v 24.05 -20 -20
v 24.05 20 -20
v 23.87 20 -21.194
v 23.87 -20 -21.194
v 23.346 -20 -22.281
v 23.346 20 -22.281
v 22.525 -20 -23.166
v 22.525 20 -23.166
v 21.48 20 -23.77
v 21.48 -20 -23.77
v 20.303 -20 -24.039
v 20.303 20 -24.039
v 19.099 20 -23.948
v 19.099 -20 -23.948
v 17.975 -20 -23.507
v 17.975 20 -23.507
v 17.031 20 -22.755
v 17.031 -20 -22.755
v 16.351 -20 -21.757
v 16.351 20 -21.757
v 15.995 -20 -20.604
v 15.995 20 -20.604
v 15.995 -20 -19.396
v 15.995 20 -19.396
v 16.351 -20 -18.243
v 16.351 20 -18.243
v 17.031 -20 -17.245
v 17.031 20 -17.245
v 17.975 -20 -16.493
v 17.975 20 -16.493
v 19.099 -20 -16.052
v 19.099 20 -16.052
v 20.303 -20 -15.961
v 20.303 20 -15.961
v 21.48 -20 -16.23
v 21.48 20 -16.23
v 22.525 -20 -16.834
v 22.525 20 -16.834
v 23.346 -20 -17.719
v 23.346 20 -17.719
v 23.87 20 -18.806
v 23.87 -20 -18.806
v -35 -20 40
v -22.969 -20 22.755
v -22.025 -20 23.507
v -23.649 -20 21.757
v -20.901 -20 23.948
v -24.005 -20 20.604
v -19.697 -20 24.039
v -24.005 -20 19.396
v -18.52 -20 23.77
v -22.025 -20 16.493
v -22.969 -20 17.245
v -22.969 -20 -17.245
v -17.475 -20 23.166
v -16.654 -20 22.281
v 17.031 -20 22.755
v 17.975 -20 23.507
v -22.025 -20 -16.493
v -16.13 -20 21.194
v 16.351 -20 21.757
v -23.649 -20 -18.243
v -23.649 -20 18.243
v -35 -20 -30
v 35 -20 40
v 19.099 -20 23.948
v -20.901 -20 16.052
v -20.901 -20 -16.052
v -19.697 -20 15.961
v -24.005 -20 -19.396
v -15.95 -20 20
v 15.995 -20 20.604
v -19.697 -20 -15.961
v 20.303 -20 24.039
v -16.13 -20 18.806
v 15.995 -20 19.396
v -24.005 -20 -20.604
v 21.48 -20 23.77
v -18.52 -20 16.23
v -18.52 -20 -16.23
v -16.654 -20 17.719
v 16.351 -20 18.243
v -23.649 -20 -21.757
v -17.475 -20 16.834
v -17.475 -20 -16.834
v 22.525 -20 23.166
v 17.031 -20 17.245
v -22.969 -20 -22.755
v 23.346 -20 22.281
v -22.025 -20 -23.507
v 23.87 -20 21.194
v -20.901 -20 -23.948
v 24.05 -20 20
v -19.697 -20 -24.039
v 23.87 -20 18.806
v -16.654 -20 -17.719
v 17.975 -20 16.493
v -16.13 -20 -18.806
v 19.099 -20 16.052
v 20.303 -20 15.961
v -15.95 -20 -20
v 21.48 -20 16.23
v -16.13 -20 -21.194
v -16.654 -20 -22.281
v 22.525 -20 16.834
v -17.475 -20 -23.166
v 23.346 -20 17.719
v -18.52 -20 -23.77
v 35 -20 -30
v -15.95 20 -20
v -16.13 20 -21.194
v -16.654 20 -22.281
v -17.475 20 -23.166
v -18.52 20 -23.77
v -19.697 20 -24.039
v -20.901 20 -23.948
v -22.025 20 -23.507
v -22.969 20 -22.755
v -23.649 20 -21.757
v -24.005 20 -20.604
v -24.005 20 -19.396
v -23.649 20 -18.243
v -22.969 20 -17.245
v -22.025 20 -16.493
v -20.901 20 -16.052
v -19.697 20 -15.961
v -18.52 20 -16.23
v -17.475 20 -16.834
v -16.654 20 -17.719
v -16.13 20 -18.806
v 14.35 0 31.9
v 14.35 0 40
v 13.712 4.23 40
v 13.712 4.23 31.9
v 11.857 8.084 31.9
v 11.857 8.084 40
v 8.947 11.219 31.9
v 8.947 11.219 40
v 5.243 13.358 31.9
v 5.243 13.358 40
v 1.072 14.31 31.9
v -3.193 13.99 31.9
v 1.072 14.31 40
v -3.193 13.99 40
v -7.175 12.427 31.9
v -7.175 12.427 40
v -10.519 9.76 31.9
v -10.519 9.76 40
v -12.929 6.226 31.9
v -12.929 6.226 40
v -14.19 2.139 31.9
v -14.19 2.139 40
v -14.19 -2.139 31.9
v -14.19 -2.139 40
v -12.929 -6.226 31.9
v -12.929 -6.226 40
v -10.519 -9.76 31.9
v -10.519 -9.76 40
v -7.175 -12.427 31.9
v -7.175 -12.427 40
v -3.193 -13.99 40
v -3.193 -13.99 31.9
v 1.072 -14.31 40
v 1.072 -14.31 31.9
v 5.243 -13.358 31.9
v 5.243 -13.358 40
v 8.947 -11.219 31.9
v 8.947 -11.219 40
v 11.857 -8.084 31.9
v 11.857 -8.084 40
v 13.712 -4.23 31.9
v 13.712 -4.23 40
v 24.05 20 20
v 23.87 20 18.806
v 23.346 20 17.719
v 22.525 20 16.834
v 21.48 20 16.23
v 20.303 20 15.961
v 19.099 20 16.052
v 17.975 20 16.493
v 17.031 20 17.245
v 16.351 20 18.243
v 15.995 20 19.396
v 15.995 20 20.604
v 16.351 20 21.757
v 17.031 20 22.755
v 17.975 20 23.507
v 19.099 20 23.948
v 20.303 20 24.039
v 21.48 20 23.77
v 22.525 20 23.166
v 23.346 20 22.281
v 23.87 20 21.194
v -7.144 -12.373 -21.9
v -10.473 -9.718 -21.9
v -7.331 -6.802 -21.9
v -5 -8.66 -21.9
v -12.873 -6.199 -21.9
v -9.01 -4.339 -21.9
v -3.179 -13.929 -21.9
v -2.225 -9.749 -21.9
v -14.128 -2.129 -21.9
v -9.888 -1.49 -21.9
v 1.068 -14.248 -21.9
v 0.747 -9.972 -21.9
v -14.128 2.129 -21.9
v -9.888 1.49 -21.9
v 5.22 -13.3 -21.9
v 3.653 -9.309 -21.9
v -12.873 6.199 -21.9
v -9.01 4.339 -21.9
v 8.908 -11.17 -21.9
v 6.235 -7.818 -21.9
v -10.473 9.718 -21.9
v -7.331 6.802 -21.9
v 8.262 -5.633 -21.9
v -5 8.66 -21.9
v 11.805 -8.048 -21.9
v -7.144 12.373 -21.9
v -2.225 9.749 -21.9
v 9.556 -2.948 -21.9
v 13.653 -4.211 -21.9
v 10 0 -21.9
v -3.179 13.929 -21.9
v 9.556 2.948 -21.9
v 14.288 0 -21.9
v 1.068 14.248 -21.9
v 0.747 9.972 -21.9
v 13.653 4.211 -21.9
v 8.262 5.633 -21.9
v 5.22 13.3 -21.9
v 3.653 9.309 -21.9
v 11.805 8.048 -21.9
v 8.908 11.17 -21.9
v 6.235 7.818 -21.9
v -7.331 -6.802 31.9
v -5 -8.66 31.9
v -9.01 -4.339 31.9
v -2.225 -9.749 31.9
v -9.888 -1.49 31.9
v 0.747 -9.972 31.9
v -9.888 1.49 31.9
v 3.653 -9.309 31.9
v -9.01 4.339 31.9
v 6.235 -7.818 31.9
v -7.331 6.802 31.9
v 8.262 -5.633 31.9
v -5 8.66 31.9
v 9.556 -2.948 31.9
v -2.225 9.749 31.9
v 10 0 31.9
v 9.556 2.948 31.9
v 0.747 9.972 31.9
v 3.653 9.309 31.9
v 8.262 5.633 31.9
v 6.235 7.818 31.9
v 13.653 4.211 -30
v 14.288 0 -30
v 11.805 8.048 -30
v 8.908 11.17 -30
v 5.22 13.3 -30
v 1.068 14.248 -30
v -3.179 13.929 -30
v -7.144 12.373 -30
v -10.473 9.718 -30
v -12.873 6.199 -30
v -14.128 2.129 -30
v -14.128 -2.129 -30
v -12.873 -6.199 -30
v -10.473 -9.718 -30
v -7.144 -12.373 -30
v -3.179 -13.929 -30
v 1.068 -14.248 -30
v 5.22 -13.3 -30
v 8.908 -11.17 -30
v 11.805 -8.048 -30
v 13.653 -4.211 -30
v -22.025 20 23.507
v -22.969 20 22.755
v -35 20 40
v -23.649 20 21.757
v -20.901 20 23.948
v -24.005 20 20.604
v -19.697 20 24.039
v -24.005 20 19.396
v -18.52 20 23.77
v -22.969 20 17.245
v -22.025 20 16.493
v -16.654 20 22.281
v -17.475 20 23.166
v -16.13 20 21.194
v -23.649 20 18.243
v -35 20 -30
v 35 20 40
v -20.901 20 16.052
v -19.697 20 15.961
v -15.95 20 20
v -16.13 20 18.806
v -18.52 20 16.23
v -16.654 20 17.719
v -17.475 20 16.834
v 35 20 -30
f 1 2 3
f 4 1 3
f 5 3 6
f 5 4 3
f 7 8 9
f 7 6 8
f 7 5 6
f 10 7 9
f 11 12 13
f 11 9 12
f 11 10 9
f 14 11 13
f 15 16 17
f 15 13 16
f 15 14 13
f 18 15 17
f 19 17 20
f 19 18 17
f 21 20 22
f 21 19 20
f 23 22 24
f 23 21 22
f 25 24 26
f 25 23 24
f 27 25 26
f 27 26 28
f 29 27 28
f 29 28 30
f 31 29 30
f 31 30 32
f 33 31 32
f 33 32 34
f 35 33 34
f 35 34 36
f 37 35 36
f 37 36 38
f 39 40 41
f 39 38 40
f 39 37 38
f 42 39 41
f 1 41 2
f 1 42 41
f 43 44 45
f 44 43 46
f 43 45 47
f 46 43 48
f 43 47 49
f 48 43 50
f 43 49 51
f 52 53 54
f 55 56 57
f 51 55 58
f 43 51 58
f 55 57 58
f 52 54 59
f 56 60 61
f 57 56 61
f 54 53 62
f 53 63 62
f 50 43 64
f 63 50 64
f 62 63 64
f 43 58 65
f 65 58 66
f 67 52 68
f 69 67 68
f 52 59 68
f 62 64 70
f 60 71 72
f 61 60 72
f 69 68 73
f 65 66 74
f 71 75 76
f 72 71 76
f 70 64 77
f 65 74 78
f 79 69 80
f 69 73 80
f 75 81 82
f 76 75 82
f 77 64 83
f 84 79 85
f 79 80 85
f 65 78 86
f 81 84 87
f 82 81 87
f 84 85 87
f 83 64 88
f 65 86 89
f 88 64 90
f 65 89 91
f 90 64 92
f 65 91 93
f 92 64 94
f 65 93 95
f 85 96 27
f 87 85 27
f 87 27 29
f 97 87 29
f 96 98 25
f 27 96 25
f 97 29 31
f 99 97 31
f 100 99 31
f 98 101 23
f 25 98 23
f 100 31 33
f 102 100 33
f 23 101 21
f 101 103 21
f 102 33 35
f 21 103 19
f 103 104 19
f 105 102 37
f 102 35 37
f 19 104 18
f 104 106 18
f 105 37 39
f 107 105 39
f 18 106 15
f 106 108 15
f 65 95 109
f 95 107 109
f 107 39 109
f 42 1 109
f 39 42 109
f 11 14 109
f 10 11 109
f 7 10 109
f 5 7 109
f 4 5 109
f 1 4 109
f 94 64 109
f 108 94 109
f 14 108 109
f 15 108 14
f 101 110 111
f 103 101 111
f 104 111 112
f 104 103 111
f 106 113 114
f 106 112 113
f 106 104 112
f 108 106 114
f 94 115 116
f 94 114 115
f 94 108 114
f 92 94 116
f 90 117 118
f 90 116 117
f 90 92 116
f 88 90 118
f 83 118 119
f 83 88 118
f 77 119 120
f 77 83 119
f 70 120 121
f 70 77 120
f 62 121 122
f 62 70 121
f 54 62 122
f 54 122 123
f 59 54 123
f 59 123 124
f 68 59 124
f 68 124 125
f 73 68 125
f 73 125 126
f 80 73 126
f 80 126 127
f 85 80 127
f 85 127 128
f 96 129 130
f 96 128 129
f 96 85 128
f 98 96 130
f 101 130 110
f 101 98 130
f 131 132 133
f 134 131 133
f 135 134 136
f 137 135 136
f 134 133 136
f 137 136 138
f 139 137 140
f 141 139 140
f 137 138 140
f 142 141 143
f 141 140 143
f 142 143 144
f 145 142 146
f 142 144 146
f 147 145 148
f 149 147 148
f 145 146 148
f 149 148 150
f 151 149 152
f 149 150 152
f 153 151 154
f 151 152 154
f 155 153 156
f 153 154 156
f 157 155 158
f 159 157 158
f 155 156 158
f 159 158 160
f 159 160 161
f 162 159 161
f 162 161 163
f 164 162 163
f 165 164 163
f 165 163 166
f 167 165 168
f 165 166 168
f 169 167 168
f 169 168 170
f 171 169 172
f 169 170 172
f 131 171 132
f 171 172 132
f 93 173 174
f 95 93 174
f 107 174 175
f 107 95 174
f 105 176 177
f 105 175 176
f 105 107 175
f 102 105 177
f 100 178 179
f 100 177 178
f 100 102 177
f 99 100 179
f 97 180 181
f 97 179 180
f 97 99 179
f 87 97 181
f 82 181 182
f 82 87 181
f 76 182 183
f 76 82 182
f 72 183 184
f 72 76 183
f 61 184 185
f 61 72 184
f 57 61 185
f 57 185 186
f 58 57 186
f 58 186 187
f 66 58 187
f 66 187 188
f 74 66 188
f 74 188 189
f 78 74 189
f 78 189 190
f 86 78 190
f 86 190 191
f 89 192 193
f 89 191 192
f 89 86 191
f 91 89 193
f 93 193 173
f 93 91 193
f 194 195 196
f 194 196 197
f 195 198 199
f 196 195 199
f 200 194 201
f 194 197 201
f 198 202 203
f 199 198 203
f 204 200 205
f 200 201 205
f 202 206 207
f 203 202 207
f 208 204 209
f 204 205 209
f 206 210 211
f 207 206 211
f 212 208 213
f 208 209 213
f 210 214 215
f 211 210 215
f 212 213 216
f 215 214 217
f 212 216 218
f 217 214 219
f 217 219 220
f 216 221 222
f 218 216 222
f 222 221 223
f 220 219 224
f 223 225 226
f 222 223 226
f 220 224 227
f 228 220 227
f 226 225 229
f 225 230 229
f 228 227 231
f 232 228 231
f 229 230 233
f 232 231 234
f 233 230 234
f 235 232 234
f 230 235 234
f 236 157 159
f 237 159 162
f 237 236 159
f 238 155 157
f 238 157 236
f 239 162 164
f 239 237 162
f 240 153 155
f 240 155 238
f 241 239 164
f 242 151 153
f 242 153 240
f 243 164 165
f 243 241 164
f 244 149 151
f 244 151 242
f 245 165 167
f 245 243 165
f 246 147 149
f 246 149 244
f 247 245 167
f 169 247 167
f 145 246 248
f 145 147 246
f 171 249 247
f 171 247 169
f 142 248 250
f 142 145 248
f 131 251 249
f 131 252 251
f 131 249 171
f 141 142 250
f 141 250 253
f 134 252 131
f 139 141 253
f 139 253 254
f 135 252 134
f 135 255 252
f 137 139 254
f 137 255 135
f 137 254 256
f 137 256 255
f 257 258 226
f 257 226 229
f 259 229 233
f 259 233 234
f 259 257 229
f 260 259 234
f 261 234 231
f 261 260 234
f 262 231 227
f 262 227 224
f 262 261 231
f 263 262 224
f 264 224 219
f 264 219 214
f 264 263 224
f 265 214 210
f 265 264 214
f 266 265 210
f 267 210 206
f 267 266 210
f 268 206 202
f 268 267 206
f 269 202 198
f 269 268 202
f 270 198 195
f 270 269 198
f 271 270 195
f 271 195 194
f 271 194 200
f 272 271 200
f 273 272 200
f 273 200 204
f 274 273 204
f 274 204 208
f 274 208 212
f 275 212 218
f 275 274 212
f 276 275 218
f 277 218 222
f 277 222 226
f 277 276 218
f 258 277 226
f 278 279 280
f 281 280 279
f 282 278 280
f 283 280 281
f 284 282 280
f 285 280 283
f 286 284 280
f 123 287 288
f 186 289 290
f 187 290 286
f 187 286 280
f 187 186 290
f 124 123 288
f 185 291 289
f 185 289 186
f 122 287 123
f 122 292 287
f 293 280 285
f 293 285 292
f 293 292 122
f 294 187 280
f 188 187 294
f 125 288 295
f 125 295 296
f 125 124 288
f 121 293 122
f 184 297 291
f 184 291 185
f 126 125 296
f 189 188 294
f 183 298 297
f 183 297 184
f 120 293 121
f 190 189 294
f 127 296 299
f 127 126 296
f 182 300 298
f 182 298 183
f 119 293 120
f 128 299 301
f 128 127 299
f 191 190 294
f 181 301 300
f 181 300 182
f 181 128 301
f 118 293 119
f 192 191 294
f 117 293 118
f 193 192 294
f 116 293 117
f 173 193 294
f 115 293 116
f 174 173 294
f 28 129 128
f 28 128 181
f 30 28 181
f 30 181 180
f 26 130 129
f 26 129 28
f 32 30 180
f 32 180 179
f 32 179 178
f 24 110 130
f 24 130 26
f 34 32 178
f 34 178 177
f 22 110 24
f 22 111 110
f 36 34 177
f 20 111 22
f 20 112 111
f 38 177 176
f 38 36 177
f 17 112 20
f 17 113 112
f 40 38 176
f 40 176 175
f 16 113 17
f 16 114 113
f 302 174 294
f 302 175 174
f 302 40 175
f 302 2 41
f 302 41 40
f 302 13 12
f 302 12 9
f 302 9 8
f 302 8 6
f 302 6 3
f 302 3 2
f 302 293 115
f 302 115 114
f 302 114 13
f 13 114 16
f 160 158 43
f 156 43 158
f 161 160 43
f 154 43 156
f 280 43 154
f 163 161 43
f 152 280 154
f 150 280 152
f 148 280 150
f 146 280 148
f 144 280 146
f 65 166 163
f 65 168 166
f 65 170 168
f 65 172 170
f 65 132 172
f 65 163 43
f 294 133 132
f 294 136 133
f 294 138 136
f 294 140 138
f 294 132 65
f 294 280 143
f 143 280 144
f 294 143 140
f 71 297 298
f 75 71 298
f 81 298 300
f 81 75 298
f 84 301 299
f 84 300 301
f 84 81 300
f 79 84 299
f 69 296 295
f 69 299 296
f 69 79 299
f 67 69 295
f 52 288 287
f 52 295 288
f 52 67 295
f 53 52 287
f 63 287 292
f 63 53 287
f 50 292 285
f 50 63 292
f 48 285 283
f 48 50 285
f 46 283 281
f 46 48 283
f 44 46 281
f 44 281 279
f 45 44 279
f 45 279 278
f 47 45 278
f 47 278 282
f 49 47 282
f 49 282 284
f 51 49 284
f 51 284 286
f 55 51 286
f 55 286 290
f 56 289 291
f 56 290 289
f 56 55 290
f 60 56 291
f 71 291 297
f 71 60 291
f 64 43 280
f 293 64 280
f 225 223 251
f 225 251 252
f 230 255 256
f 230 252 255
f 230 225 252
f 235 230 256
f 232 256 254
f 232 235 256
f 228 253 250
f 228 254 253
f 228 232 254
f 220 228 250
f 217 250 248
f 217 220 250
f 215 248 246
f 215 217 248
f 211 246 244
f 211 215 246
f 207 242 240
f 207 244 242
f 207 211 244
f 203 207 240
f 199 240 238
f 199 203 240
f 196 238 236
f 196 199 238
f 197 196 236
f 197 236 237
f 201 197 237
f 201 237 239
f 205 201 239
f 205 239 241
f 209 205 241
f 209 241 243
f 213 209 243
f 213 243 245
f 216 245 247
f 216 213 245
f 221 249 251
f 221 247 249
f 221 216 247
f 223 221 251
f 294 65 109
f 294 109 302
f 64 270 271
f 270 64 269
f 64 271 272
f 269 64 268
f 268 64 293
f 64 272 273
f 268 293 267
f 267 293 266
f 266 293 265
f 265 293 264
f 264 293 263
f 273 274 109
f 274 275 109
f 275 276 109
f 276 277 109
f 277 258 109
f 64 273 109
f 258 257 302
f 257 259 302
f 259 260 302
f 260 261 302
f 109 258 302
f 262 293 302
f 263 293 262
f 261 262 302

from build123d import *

# Parameters (mm, degrees)
BOSS_EXTRUDE1_DEPTH      = 40
BOSS_EXTRUDE1_DEPTH_BACK = 30
SKETCH1_W                = 70
SKETCH1_H                = 40
SKETCH1_R                = 10
CUT_EXTRUDE1_DEPTH       = 25
CUT_EXTRUDE1_DEPTH_BACK  = 25
SKETCH2_R                = 4.05
CUT_EXTRUDE2_START       = 40
SKETCH3_R                = 14.35
CUT_EXTRUDE2_DEPTH       = 8.1
CUT_EXTRUDE3_START       = -30
SKETCH4_R                = 14.2875
CUT_EXTRUDE3_DEPTH       = 8.1


with BuildPart() as part:
    # Sketch1 → Boss-Extrude1 (new, two sides: drawn at the far end of the back side and taken through both)
    with BuildSketch(Plane.XY.offset(-BOSS_EXTRUDE1_DEPTH_BACK)):
        Rectangle(SKETCH1_W, SKETCH1_H)
        Circle(SKETCH1_R, mode=Mode.SUBTRACT)
    extrude(amount=BOSS_EXTRUDE1_DEPTH + BOSS_EXTRUDE1_DEPTH_BACK)

    # Sketch2 → Cut-Extrude1 (cut, two sides: drawn at the far end of the back side and taken through both)
    with BuildSketch(Plane(origin=(0, 0, 0), x_dir=(1, 0, 0), z_dir=(0, 1, 0)).offset(-CUT_EXTRUDE1_DEPTH_BACK)):
        with Locations((-20, 20)):
            Circle(SKETCH2_R)
        with Locations((20, 20)):
            Circle(SKETCH2_R)
        with Locations((-20, -20)):
            Circle(SKETCH2_R)
        with Locations((20, -20)):
            Circle(SKETCH2_R)
    extrude(amount=CUT_EXTRUDE1_DEPTH + CUT_EXTRUDE1_DEPTH_BACK, mode=Mode.SUBTRACT)

    # Sketch3 → Cut-Extrude2 (cut)
    with BuildSketch(Plane.XY.offset(CUT_EXTRUDE2_START)):
        Circle(SKETCH3_R)
    extrude(amount=-CUT_EXTRUDE2_DEPTH, mode=Mode.SUBTRACT)

    # Sketch4 → Cut-Extrude3 (cut)
    with BuildSketch(Plane.XY.offset(CUT_EXTRUDE3_START)):
        Circle(SKETCH4_R)
    extrude(amount=CUT_EXTRUDE3_DEPTH, mode=Mode.SUBTRACT)


solid = part.part
